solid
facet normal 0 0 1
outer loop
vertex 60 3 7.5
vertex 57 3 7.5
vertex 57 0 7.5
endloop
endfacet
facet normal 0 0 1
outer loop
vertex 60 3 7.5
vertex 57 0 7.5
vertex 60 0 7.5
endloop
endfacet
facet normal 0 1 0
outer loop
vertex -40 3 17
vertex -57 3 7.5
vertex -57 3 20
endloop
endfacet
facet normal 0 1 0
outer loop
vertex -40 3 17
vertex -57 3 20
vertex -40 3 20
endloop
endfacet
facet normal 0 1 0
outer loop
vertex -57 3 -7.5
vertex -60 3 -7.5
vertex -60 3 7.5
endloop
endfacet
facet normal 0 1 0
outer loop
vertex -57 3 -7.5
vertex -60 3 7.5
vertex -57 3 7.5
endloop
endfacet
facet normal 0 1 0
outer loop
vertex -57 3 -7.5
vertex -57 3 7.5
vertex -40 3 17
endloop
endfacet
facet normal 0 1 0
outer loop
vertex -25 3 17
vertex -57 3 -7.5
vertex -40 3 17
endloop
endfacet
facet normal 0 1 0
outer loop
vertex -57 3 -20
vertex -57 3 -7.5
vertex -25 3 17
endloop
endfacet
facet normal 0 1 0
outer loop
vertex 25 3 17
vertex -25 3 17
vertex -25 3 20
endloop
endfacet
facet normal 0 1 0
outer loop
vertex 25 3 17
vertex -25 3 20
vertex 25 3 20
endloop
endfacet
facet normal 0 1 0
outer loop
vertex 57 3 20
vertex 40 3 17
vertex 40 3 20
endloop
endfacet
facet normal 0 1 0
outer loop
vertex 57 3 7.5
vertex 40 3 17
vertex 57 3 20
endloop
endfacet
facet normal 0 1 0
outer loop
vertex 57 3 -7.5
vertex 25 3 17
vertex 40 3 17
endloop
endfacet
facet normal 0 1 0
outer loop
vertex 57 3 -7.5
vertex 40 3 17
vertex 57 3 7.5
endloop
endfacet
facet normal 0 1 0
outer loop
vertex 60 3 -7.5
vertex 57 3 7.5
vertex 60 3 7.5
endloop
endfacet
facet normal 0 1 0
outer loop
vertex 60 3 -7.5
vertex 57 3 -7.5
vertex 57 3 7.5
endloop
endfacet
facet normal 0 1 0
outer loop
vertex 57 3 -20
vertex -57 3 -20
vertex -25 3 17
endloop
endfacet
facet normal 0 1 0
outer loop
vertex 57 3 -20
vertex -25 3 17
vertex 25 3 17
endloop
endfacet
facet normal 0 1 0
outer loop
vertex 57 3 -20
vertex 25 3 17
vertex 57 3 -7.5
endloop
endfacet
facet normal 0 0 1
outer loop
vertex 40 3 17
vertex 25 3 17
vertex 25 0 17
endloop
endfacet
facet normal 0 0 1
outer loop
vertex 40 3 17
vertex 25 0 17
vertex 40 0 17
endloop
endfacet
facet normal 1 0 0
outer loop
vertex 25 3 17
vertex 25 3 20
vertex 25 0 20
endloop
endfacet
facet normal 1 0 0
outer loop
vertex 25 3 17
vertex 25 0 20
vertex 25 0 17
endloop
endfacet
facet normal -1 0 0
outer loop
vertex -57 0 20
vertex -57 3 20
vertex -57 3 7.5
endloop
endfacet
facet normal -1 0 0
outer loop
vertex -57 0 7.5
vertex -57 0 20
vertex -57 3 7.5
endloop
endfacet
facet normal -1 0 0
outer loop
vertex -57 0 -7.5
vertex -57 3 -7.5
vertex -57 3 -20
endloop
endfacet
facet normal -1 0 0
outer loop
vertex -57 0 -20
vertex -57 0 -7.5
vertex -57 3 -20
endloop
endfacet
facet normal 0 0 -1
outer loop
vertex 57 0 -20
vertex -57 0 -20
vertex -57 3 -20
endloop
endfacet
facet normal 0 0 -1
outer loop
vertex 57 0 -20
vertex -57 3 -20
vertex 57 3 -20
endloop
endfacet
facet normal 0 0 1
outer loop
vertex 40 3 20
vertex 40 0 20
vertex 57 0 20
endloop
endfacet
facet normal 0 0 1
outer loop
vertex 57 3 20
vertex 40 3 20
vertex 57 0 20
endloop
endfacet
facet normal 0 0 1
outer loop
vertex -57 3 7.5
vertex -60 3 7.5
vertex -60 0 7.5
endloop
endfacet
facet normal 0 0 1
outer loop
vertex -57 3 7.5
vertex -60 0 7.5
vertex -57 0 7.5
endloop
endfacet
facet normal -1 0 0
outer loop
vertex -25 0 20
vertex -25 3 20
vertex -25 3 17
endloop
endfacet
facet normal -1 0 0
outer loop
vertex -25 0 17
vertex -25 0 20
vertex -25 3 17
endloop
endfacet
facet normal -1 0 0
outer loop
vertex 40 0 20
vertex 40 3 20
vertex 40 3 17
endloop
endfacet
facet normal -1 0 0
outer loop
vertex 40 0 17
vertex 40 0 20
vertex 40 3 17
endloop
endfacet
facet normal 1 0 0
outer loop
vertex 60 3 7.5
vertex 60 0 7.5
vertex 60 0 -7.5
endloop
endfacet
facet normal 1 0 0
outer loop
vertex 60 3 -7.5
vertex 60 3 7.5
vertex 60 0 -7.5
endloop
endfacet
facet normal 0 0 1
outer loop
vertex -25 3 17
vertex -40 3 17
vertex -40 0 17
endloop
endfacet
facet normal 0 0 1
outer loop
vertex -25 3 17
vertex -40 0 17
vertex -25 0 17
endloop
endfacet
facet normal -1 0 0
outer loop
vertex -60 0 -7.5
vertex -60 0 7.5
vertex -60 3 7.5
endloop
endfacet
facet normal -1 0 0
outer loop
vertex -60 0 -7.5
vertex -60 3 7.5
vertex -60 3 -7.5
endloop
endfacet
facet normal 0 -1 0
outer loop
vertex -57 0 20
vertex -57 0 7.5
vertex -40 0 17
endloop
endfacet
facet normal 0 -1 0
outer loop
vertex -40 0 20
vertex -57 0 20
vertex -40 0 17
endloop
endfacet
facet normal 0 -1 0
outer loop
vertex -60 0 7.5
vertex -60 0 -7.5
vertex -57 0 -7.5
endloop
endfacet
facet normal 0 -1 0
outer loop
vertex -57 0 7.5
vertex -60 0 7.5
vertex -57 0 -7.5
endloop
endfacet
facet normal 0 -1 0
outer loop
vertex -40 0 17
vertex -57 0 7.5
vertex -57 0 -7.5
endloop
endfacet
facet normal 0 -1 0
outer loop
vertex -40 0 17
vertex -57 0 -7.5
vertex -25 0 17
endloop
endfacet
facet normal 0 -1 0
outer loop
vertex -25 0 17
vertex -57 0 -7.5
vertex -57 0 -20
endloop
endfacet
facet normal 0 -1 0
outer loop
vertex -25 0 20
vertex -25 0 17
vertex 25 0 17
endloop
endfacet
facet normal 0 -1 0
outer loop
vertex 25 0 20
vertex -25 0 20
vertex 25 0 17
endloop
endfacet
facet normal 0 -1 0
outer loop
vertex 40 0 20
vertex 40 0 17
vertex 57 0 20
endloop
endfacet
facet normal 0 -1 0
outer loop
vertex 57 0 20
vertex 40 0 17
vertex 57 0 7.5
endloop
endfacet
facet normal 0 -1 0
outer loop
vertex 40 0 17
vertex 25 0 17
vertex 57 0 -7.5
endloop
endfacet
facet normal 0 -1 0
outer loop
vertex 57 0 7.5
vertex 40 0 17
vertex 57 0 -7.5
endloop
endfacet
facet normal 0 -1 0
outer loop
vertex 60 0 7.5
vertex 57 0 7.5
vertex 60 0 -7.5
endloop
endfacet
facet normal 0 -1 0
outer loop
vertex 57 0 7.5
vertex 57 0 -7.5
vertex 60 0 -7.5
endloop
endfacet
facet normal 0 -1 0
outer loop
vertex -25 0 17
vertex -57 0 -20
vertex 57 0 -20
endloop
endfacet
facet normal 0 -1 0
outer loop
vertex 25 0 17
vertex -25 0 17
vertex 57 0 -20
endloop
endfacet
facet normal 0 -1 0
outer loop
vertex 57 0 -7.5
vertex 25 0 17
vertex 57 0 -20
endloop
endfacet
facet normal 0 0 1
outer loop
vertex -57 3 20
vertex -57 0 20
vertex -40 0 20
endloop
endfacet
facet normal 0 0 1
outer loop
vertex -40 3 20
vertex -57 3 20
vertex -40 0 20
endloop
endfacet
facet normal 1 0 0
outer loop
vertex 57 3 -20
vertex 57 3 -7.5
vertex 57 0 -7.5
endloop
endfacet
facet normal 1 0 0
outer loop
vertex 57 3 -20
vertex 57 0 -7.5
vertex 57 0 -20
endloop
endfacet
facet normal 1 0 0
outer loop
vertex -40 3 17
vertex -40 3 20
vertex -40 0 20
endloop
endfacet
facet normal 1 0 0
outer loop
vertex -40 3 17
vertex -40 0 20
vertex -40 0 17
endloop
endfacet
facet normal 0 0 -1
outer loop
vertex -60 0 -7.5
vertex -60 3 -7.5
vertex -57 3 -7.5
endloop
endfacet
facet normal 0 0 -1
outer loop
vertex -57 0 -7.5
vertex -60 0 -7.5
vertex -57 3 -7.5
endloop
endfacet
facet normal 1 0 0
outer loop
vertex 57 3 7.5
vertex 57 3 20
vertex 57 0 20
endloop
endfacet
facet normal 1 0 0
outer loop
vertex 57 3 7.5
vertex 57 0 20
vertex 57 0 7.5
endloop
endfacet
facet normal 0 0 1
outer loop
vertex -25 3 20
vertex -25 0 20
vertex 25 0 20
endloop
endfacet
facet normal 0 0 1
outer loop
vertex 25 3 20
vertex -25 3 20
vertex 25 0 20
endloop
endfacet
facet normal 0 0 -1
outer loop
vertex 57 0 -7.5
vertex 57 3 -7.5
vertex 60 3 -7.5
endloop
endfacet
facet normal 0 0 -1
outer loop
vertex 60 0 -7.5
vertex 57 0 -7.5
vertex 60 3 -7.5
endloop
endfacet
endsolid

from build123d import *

# Parameters (mm, degrees)
SKETCH1_W           = 120
SKETCH1_H           = 40
BOSS_EXTRUDE1_DEPTH = 3
SKETCH2_W           = 3
SKETCH2_H           = 12.5
CUT_EXTRUDE1_DEPTH  = 64.316664473
SKETCH3_W           = 15
SKETCH3_H           = 3
CUT_EXTRUDE2_DEPTH  = 64.316664473


with BuildPart() as part:
    # Sketch1 → Boss-Extrude1 (new body)
    with BuildSketch(Plane(origin=(0, 0, 0), x_dir=(1, 0, 0), z_dir=(0, 1, 0))):
        Rectangle(SKETCH1_W, SKETCH1_H)
    extrude(amount=BOSS_EXTRUDE1_DEPTH)

    # Sketch2 → Cut-Extrude1 (cut, through all)
    with BuildSketch(Plane(origin=(0, 3, 0), x_dir=(1, 0, 0), z_dir=(0, 1, 0))):
        with Locations((-58.5, 13.75)):
            Rectangle(SKETCH2_W, SKETCH2_H)
        with Locations((-58.5, -13.75)):
            Rectangle(SKETCH2_W, SKETCH2_H)
        with Locations((58.5, 13.75)):
            Rectangle(SKETCH2_W, SKETCH2_H)
        with Locations((58.5, -13.75)):
            Rectangle(SKETCH2_W, SKETCH2_H)
    extrude(amount=-CUT_EXTRUDE1_DEPTH, mode=Mode.SUBTRACT)

    # Sketch3 → Cut-Extrude2 (cut, through all)
    with BuildSketch(Plane(origin=(0, 3, 0), x_dir=(1, 0, 0), z_dir=(0, 1, 0))):
        with Locations((-32.5, -18.5)):
            Rectangle(SKETCH3_W, SKETCH3_H)
        with Locations((32.5, -18.5)):
            Rectangle(SKETCH3_W, SKETCH3_H)
    extrude(amount=-CUT_EXTRUDE2_DEPTH, mode=Mode.SUBTRACT)


solid = part.part
